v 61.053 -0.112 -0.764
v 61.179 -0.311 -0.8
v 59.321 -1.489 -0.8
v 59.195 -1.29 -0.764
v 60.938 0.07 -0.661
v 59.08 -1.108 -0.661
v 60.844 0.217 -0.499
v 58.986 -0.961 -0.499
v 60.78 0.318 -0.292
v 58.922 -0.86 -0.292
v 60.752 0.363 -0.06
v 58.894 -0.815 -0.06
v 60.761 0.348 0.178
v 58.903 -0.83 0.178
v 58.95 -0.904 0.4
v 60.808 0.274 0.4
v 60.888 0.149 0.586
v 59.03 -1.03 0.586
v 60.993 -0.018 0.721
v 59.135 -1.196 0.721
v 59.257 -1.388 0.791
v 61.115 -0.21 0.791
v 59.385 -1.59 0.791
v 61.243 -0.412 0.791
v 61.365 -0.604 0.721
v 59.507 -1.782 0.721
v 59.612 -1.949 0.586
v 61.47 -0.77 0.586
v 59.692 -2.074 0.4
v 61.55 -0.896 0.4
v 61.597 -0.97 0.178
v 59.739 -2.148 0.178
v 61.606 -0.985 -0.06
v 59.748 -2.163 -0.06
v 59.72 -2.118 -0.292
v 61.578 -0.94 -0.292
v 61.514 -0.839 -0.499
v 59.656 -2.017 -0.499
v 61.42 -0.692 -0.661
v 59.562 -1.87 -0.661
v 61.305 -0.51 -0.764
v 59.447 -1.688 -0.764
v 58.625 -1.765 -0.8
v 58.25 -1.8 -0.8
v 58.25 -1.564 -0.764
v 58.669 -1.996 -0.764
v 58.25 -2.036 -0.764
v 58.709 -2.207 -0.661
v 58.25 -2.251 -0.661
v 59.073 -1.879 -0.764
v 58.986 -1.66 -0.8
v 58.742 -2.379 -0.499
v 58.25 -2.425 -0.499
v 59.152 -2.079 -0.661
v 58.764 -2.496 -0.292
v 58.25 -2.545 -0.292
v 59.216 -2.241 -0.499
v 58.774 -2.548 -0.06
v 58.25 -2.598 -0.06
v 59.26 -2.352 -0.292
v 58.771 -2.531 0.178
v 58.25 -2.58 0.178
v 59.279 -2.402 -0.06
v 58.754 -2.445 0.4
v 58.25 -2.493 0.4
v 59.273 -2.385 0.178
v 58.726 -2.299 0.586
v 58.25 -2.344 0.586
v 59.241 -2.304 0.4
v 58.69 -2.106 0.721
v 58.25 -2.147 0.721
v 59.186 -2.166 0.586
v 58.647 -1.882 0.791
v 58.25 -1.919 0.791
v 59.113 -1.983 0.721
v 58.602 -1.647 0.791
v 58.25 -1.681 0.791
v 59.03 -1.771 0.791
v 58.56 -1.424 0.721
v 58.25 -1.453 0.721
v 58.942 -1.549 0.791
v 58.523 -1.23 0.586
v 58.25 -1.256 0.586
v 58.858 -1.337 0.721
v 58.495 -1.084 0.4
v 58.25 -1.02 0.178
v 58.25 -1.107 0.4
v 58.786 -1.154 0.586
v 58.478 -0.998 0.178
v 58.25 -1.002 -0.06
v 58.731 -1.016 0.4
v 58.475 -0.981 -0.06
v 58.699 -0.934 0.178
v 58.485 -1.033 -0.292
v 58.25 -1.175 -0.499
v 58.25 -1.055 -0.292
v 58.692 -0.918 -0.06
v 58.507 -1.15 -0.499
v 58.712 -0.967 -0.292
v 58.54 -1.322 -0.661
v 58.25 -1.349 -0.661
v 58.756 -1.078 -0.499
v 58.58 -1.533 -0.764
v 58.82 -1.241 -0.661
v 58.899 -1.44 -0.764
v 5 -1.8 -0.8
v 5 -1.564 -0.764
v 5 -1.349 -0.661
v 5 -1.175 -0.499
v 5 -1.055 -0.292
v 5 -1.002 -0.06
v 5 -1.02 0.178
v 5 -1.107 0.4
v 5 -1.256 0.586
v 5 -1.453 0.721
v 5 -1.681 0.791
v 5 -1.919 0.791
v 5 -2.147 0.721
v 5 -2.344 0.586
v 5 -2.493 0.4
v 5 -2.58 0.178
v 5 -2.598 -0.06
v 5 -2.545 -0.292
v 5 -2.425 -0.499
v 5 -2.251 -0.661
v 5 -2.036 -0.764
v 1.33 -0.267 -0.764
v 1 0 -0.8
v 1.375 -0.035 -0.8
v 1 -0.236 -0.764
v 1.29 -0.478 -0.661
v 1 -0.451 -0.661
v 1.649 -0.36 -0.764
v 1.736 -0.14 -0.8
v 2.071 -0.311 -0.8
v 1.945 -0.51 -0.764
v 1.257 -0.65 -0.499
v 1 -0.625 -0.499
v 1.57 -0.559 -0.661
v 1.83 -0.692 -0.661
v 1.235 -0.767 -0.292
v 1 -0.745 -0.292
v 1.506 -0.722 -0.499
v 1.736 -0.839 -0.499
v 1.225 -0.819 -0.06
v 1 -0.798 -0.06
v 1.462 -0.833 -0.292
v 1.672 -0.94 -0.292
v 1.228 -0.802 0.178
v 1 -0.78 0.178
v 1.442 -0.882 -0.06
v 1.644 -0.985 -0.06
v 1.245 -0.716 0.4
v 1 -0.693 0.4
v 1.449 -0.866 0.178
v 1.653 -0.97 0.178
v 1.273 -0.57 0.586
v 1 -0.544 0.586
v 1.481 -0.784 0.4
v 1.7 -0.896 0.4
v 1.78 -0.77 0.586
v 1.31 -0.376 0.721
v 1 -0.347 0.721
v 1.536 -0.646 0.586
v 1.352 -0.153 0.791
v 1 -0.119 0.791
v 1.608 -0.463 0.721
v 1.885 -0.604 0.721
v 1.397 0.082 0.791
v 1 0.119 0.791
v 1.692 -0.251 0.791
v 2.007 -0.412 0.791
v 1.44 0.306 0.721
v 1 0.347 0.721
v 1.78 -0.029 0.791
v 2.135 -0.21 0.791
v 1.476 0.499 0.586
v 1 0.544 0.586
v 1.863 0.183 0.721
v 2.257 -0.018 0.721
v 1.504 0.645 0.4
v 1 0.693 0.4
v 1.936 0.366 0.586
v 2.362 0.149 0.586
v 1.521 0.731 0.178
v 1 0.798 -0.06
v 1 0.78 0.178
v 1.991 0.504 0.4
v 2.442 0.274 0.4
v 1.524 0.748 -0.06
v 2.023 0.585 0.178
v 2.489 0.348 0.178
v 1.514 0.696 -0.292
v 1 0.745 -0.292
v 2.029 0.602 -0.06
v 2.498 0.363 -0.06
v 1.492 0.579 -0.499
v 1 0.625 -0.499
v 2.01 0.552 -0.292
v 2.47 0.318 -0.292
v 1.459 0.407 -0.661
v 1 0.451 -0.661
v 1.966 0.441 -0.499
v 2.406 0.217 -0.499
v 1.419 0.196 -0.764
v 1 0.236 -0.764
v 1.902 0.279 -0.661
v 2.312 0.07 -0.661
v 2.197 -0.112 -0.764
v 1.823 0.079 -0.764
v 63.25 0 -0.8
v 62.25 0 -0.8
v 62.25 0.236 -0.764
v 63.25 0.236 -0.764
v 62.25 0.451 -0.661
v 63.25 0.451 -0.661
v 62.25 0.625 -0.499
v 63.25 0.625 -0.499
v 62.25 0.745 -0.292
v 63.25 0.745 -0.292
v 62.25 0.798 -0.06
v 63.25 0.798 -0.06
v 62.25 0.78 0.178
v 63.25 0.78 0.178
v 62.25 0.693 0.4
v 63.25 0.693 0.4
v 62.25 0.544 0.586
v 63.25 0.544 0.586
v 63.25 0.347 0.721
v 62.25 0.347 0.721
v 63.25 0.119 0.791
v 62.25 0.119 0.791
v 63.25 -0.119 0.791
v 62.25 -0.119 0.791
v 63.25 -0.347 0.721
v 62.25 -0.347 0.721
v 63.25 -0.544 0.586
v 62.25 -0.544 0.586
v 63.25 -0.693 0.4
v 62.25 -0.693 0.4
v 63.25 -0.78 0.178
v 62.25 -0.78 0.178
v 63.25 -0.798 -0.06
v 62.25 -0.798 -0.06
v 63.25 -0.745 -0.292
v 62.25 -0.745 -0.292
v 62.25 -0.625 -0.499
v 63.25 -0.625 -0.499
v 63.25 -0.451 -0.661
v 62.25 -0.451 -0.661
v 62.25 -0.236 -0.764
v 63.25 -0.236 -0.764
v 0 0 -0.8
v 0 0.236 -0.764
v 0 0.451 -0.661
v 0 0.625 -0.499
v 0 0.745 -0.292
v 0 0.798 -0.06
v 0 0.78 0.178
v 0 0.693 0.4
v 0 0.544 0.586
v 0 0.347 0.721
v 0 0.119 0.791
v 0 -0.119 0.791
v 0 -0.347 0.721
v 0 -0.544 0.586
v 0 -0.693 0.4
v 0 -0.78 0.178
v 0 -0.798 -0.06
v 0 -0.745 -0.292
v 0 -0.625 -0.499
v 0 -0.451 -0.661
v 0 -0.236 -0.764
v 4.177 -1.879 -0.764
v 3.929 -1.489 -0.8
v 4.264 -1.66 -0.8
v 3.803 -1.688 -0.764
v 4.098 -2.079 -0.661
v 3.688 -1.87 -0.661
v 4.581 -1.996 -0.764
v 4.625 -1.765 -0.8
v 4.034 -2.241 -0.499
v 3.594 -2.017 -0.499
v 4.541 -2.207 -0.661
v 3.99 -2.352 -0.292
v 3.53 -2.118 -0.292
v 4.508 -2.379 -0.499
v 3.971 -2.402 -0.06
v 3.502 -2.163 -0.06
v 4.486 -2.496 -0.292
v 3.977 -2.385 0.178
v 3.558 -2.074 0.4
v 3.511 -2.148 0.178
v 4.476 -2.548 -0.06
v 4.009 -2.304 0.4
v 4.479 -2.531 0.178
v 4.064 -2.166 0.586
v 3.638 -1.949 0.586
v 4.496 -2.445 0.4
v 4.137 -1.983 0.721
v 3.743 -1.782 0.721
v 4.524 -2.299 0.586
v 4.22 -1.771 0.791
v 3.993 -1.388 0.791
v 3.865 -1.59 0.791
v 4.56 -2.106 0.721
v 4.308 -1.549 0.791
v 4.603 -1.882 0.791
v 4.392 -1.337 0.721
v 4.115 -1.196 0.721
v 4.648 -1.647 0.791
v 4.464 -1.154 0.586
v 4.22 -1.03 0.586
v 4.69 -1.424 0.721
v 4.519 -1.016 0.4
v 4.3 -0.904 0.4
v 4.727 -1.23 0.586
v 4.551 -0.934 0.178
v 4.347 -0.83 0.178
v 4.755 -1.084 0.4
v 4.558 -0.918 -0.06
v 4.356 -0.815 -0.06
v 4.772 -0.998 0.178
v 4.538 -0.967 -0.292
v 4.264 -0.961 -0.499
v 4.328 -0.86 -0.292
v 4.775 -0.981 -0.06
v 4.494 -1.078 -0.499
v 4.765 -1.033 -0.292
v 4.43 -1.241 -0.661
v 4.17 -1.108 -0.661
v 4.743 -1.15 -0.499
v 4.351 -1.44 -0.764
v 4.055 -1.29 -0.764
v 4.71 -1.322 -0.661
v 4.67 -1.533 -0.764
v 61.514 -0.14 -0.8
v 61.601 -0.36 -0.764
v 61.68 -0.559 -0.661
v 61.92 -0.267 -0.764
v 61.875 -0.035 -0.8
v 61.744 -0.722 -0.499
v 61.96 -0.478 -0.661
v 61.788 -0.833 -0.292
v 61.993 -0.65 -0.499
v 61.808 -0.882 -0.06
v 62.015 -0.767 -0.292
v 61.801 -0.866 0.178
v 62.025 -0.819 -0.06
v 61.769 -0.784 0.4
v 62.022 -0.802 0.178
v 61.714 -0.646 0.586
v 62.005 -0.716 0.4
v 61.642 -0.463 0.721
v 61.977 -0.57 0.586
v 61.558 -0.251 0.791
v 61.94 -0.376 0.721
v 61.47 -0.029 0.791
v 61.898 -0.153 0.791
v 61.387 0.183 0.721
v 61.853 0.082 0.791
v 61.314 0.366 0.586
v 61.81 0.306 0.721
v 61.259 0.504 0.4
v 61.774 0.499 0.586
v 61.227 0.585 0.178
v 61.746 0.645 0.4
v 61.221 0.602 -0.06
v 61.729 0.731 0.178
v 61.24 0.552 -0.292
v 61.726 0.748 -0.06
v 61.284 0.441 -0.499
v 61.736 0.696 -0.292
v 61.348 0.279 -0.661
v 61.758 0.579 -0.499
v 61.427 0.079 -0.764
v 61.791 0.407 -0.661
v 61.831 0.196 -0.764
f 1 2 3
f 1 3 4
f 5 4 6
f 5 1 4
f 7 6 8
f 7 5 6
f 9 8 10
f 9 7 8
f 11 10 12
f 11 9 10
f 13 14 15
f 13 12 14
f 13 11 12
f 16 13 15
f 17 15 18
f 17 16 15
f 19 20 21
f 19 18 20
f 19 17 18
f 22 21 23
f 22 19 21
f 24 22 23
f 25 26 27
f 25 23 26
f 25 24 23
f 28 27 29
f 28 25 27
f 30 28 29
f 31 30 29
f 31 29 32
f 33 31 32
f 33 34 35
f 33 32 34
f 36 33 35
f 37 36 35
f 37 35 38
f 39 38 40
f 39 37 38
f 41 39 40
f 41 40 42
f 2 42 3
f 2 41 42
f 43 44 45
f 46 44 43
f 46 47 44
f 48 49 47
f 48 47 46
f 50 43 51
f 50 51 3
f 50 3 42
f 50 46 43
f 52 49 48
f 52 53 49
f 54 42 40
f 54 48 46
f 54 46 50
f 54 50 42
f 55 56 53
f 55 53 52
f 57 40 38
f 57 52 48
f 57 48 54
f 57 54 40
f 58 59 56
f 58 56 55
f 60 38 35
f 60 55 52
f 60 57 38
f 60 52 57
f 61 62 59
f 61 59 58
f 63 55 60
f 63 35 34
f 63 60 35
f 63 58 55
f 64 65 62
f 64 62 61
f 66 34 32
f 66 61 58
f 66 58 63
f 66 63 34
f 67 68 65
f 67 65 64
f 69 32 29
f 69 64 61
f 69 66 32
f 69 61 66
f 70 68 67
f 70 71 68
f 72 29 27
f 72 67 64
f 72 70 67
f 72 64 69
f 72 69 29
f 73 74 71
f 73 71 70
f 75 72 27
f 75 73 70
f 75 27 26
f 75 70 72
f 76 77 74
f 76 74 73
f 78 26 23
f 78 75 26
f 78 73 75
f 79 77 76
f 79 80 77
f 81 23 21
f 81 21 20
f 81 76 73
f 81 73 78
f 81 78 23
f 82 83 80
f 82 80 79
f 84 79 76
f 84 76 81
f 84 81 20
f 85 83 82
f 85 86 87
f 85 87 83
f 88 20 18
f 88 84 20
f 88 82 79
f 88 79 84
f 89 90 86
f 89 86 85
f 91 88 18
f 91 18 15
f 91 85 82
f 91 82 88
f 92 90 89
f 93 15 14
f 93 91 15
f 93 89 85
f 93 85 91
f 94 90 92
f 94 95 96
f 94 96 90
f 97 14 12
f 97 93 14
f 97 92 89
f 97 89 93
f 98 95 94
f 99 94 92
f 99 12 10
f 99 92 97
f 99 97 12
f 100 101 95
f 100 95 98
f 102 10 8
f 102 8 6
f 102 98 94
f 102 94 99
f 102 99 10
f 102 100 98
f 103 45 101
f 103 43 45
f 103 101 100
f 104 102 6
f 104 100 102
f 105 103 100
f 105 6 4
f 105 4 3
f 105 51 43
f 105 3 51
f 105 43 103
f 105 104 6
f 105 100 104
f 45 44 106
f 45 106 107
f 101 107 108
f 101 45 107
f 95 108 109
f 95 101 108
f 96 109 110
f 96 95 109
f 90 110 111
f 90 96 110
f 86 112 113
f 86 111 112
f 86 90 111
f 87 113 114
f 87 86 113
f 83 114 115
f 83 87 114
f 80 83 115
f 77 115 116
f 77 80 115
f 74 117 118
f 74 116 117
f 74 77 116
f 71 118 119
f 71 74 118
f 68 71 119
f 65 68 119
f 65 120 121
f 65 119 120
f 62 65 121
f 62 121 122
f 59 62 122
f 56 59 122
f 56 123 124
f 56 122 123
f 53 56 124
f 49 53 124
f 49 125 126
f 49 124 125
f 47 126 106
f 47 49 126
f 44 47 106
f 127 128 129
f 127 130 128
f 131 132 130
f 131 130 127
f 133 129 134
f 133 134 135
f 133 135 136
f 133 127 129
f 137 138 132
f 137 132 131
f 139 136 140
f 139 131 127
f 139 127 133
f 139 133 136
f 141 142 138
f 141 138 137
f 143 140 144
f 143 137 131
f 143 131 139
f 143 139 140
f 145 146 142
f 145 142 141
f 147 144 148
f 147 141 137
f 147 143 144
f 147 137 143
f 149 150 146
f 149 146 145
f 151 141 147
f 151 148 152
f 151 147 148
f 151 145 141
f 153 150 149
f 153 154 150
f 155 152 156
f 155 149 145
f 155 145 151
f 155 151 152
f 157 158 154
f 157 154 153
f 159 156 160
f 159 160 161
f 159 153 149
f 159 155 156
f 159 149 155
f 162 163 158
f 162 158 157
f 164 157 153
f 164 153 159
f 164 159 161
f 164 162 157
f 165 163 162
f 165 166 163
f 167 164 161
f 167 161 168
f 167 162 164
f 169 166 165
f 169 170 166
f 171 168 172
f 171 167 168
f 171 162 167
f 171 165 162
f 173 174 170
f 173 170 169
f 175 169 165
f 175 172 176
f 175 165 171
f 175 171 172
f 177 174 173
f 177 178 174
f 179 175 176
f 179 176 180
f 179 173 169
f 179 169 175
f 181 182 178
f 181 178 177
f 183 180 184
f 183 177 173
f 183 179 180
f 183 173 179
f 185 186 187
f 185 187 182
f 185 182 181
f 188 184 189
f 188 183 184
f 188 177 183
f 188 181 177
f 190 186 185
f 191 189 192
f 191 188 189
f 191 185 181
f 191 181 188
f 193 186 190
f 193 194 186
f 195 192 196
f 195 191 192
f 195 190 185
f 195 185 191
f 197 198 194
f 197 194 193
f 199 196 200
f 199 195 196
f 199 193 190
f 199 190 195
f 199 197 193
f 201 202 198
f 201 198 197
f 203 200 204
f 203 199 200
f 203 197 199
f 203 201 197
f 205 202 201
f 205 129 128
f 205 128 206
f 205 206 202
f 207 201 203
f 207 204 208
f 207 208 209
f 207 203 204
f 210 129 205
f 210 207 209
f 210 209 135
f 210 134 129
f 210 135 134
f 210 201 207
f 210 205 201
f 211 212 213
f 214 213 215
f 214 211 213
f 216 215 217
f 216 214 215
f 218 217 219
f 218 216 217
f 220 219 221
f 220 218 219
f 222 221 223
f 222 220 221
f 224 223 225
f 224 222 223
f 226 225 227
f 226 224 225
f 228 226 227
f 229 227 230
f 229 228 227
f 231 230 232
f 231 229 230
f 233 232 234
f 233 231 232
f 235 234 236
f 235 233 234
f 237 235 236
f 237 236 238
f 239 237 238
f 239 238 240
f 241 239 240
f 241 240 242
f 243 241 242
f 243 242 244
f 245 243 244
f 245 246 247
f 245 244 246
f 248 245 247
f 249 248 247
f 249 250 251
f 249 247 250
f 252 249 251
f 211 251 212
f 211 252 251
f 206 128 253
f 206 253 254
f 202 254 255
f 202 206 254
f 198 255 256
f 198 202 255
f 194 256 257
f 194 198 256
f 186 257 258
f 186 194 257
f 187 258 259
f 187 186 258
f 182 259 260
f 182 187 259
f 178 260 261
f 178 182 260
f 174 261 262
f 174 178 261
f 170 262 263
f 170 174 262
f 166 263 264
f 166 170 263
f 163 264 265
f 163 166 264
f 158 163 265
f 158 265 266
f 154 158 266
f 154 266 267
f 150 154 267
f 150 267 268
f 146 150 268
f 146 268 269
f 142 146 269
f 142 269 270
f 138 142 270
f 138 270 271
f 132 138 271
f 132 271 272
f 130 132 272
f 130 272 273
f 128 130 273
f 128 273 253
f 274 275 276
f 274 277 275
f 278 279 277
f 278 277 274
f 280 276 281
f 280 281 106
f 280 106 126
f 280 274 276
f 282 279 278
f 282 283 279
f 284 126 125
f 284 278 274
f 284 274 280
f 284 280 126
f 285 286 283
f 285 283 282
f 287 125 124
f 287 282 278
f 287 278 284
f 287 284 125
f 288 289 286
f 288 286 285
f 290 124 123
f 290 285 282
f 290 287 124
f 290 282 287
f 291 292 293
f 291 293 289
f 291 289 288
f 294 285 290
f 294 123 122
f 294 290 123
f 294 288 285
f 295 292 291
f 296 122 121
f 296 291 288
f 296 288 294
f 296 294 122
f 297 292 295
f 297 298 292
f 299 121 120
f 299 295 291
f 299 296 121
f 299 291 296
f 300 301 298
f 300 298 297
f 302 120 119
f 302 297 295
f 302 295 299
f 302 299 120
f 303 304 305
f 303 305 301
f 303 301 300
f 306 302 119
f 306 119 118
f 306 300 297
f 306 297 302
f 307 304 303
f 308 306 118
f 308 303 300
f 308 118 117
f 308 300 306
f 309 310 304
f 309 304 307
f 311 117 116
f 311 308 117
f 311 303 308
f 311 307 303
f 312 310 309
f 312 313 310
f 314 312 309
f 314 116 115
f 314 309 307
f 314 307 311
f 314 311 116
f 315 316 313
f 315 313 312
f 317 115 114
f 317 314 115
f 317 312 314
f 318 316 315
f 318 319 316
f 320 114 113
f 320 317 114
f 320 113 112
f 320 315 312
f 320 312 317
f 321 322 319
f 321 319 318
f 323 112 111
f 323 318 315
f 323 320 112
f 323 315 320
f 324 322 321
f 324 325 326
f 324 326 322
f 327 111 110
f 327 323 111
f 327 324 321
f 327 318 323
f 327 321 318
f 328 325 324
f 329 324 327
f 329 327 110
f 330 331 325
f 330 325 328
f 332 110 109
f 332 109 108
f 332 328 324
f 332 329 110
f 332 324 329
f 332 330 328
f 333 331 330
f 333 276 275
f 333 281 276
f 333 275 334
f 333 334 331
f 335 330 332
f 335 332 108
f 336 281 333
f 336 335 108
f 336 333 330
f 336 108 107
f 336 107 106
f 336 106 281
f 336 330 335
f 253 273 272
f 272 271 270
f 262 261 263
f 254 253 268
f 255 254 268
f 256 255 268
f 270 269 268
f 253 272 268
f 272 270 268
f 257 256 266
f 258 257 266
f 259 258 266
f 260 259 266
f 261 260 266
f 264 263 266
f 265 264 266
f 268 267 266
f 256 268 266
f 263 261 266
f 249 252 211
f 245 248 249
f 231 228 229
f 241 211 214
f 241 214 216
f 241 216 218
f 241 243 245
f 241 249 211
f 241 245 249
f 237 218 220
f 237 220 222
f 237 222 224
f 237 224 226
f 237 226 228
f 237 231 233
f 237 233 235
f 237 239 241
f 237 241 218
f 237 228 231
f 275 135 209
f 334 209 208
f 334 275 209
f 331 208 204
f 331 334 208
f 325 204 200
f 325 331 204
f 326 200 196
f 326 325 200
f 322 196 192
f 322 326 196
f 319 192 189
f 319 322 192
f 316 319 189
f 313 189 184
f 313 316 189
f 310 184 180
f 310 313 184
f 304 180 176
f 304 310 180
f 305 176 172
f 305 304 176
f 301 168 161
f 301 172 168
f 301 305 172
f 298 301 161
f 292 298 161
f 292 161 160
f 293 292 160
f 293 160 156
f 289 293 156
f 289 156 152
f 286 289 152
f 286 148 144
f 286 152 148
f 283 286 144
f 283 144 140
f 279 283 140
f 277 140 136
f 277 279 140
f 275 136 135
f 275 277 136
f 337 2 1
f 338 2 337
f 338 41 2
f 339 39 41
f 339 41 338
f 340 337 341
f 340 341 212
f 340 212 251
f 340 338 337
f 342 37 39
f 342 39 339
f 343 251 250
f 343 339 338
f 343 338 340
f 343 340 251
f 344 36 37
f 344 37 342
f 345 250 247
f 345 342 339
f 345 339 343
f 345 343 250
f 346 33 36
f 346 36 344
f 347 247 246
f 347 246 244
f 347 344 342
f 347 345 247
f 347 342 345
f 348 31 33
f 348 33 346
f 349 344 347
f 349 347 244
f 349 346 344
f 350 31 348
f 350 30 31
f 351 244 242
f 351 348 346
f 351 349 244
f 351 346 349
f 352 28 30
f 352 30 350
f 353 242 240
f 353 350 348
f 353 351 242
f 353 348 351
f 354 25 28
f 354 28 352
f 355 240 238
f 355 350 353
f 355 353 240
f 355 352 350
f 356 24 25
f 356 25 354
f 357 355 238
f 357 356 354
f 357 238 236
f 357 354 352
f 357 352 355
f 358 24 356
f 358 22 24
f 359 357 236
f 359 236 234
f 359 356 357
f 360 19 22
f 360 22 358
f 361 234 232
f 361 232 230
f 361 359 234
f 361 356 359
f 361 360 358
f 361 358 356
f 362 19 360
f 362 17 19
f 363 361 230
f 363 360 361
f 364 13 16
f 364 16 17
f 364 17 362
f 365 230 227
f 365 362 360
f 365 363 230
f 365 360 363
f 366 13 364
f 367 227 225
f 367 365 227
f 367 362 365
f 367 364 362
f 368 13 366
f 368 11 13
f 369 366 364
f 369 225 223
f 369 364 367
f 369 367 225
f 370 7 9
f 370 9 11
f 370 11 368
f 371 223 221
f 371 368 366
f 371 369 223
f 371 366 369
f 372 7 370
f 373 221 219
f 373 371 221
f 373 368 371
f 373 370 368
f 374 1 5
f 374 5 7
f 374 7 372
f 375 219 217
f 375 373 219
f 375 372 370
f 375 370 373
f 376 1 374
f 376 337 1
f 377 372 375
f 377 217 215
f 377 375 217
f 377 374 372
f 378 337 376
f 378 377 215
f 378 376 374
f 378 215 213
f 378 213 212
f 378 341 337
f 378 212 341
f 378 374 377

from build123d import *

# Parameters (mm, degrees)
SKETCH1_R = 0.8


with BuildPart() as part:
    # Sweep1: sweep along a path in Sketch2
    with BuildLine(Plane.XY) as sweep1_path:
        Line((0, 0), (1, 0))
        ThreePointArc((1, 0), (1.55762039, -0.079307546), (2.071017274, -0.310940499))
        Line((2.071017274, -0.310940499), (3.928982726, -1.489059501))
        ThreePointArc((3.928982726, -1.489059501), (4.44237961, -1.720692454), (5, -1.8))
        Line((5, -1.8), (58.25, -1.8))
        ThreePointArc((58.25, -1.8), (58.80762039, -1.720692454), (59.321017274, -1.489059501))
        Line((59.321017274, -1.489059501), (61.178982726, -0.310940499))
        ThreePointArc((61.178982726, -0.310940499), (61.69237961, -0.079307546), (62.25, 0))
        Line((62.25, 0), (63.25, 0))
    # Sketch1 → Sweep1 (sweep)
    with BuildSketch(Plane(origin=(0, 0, 0), x_dir=(0, 0, -1), z_dir=(1, 0, 0))):
        Circle(SKETCH1_R)
    sweep(path=sweep1_path.line)


solid = part.part
